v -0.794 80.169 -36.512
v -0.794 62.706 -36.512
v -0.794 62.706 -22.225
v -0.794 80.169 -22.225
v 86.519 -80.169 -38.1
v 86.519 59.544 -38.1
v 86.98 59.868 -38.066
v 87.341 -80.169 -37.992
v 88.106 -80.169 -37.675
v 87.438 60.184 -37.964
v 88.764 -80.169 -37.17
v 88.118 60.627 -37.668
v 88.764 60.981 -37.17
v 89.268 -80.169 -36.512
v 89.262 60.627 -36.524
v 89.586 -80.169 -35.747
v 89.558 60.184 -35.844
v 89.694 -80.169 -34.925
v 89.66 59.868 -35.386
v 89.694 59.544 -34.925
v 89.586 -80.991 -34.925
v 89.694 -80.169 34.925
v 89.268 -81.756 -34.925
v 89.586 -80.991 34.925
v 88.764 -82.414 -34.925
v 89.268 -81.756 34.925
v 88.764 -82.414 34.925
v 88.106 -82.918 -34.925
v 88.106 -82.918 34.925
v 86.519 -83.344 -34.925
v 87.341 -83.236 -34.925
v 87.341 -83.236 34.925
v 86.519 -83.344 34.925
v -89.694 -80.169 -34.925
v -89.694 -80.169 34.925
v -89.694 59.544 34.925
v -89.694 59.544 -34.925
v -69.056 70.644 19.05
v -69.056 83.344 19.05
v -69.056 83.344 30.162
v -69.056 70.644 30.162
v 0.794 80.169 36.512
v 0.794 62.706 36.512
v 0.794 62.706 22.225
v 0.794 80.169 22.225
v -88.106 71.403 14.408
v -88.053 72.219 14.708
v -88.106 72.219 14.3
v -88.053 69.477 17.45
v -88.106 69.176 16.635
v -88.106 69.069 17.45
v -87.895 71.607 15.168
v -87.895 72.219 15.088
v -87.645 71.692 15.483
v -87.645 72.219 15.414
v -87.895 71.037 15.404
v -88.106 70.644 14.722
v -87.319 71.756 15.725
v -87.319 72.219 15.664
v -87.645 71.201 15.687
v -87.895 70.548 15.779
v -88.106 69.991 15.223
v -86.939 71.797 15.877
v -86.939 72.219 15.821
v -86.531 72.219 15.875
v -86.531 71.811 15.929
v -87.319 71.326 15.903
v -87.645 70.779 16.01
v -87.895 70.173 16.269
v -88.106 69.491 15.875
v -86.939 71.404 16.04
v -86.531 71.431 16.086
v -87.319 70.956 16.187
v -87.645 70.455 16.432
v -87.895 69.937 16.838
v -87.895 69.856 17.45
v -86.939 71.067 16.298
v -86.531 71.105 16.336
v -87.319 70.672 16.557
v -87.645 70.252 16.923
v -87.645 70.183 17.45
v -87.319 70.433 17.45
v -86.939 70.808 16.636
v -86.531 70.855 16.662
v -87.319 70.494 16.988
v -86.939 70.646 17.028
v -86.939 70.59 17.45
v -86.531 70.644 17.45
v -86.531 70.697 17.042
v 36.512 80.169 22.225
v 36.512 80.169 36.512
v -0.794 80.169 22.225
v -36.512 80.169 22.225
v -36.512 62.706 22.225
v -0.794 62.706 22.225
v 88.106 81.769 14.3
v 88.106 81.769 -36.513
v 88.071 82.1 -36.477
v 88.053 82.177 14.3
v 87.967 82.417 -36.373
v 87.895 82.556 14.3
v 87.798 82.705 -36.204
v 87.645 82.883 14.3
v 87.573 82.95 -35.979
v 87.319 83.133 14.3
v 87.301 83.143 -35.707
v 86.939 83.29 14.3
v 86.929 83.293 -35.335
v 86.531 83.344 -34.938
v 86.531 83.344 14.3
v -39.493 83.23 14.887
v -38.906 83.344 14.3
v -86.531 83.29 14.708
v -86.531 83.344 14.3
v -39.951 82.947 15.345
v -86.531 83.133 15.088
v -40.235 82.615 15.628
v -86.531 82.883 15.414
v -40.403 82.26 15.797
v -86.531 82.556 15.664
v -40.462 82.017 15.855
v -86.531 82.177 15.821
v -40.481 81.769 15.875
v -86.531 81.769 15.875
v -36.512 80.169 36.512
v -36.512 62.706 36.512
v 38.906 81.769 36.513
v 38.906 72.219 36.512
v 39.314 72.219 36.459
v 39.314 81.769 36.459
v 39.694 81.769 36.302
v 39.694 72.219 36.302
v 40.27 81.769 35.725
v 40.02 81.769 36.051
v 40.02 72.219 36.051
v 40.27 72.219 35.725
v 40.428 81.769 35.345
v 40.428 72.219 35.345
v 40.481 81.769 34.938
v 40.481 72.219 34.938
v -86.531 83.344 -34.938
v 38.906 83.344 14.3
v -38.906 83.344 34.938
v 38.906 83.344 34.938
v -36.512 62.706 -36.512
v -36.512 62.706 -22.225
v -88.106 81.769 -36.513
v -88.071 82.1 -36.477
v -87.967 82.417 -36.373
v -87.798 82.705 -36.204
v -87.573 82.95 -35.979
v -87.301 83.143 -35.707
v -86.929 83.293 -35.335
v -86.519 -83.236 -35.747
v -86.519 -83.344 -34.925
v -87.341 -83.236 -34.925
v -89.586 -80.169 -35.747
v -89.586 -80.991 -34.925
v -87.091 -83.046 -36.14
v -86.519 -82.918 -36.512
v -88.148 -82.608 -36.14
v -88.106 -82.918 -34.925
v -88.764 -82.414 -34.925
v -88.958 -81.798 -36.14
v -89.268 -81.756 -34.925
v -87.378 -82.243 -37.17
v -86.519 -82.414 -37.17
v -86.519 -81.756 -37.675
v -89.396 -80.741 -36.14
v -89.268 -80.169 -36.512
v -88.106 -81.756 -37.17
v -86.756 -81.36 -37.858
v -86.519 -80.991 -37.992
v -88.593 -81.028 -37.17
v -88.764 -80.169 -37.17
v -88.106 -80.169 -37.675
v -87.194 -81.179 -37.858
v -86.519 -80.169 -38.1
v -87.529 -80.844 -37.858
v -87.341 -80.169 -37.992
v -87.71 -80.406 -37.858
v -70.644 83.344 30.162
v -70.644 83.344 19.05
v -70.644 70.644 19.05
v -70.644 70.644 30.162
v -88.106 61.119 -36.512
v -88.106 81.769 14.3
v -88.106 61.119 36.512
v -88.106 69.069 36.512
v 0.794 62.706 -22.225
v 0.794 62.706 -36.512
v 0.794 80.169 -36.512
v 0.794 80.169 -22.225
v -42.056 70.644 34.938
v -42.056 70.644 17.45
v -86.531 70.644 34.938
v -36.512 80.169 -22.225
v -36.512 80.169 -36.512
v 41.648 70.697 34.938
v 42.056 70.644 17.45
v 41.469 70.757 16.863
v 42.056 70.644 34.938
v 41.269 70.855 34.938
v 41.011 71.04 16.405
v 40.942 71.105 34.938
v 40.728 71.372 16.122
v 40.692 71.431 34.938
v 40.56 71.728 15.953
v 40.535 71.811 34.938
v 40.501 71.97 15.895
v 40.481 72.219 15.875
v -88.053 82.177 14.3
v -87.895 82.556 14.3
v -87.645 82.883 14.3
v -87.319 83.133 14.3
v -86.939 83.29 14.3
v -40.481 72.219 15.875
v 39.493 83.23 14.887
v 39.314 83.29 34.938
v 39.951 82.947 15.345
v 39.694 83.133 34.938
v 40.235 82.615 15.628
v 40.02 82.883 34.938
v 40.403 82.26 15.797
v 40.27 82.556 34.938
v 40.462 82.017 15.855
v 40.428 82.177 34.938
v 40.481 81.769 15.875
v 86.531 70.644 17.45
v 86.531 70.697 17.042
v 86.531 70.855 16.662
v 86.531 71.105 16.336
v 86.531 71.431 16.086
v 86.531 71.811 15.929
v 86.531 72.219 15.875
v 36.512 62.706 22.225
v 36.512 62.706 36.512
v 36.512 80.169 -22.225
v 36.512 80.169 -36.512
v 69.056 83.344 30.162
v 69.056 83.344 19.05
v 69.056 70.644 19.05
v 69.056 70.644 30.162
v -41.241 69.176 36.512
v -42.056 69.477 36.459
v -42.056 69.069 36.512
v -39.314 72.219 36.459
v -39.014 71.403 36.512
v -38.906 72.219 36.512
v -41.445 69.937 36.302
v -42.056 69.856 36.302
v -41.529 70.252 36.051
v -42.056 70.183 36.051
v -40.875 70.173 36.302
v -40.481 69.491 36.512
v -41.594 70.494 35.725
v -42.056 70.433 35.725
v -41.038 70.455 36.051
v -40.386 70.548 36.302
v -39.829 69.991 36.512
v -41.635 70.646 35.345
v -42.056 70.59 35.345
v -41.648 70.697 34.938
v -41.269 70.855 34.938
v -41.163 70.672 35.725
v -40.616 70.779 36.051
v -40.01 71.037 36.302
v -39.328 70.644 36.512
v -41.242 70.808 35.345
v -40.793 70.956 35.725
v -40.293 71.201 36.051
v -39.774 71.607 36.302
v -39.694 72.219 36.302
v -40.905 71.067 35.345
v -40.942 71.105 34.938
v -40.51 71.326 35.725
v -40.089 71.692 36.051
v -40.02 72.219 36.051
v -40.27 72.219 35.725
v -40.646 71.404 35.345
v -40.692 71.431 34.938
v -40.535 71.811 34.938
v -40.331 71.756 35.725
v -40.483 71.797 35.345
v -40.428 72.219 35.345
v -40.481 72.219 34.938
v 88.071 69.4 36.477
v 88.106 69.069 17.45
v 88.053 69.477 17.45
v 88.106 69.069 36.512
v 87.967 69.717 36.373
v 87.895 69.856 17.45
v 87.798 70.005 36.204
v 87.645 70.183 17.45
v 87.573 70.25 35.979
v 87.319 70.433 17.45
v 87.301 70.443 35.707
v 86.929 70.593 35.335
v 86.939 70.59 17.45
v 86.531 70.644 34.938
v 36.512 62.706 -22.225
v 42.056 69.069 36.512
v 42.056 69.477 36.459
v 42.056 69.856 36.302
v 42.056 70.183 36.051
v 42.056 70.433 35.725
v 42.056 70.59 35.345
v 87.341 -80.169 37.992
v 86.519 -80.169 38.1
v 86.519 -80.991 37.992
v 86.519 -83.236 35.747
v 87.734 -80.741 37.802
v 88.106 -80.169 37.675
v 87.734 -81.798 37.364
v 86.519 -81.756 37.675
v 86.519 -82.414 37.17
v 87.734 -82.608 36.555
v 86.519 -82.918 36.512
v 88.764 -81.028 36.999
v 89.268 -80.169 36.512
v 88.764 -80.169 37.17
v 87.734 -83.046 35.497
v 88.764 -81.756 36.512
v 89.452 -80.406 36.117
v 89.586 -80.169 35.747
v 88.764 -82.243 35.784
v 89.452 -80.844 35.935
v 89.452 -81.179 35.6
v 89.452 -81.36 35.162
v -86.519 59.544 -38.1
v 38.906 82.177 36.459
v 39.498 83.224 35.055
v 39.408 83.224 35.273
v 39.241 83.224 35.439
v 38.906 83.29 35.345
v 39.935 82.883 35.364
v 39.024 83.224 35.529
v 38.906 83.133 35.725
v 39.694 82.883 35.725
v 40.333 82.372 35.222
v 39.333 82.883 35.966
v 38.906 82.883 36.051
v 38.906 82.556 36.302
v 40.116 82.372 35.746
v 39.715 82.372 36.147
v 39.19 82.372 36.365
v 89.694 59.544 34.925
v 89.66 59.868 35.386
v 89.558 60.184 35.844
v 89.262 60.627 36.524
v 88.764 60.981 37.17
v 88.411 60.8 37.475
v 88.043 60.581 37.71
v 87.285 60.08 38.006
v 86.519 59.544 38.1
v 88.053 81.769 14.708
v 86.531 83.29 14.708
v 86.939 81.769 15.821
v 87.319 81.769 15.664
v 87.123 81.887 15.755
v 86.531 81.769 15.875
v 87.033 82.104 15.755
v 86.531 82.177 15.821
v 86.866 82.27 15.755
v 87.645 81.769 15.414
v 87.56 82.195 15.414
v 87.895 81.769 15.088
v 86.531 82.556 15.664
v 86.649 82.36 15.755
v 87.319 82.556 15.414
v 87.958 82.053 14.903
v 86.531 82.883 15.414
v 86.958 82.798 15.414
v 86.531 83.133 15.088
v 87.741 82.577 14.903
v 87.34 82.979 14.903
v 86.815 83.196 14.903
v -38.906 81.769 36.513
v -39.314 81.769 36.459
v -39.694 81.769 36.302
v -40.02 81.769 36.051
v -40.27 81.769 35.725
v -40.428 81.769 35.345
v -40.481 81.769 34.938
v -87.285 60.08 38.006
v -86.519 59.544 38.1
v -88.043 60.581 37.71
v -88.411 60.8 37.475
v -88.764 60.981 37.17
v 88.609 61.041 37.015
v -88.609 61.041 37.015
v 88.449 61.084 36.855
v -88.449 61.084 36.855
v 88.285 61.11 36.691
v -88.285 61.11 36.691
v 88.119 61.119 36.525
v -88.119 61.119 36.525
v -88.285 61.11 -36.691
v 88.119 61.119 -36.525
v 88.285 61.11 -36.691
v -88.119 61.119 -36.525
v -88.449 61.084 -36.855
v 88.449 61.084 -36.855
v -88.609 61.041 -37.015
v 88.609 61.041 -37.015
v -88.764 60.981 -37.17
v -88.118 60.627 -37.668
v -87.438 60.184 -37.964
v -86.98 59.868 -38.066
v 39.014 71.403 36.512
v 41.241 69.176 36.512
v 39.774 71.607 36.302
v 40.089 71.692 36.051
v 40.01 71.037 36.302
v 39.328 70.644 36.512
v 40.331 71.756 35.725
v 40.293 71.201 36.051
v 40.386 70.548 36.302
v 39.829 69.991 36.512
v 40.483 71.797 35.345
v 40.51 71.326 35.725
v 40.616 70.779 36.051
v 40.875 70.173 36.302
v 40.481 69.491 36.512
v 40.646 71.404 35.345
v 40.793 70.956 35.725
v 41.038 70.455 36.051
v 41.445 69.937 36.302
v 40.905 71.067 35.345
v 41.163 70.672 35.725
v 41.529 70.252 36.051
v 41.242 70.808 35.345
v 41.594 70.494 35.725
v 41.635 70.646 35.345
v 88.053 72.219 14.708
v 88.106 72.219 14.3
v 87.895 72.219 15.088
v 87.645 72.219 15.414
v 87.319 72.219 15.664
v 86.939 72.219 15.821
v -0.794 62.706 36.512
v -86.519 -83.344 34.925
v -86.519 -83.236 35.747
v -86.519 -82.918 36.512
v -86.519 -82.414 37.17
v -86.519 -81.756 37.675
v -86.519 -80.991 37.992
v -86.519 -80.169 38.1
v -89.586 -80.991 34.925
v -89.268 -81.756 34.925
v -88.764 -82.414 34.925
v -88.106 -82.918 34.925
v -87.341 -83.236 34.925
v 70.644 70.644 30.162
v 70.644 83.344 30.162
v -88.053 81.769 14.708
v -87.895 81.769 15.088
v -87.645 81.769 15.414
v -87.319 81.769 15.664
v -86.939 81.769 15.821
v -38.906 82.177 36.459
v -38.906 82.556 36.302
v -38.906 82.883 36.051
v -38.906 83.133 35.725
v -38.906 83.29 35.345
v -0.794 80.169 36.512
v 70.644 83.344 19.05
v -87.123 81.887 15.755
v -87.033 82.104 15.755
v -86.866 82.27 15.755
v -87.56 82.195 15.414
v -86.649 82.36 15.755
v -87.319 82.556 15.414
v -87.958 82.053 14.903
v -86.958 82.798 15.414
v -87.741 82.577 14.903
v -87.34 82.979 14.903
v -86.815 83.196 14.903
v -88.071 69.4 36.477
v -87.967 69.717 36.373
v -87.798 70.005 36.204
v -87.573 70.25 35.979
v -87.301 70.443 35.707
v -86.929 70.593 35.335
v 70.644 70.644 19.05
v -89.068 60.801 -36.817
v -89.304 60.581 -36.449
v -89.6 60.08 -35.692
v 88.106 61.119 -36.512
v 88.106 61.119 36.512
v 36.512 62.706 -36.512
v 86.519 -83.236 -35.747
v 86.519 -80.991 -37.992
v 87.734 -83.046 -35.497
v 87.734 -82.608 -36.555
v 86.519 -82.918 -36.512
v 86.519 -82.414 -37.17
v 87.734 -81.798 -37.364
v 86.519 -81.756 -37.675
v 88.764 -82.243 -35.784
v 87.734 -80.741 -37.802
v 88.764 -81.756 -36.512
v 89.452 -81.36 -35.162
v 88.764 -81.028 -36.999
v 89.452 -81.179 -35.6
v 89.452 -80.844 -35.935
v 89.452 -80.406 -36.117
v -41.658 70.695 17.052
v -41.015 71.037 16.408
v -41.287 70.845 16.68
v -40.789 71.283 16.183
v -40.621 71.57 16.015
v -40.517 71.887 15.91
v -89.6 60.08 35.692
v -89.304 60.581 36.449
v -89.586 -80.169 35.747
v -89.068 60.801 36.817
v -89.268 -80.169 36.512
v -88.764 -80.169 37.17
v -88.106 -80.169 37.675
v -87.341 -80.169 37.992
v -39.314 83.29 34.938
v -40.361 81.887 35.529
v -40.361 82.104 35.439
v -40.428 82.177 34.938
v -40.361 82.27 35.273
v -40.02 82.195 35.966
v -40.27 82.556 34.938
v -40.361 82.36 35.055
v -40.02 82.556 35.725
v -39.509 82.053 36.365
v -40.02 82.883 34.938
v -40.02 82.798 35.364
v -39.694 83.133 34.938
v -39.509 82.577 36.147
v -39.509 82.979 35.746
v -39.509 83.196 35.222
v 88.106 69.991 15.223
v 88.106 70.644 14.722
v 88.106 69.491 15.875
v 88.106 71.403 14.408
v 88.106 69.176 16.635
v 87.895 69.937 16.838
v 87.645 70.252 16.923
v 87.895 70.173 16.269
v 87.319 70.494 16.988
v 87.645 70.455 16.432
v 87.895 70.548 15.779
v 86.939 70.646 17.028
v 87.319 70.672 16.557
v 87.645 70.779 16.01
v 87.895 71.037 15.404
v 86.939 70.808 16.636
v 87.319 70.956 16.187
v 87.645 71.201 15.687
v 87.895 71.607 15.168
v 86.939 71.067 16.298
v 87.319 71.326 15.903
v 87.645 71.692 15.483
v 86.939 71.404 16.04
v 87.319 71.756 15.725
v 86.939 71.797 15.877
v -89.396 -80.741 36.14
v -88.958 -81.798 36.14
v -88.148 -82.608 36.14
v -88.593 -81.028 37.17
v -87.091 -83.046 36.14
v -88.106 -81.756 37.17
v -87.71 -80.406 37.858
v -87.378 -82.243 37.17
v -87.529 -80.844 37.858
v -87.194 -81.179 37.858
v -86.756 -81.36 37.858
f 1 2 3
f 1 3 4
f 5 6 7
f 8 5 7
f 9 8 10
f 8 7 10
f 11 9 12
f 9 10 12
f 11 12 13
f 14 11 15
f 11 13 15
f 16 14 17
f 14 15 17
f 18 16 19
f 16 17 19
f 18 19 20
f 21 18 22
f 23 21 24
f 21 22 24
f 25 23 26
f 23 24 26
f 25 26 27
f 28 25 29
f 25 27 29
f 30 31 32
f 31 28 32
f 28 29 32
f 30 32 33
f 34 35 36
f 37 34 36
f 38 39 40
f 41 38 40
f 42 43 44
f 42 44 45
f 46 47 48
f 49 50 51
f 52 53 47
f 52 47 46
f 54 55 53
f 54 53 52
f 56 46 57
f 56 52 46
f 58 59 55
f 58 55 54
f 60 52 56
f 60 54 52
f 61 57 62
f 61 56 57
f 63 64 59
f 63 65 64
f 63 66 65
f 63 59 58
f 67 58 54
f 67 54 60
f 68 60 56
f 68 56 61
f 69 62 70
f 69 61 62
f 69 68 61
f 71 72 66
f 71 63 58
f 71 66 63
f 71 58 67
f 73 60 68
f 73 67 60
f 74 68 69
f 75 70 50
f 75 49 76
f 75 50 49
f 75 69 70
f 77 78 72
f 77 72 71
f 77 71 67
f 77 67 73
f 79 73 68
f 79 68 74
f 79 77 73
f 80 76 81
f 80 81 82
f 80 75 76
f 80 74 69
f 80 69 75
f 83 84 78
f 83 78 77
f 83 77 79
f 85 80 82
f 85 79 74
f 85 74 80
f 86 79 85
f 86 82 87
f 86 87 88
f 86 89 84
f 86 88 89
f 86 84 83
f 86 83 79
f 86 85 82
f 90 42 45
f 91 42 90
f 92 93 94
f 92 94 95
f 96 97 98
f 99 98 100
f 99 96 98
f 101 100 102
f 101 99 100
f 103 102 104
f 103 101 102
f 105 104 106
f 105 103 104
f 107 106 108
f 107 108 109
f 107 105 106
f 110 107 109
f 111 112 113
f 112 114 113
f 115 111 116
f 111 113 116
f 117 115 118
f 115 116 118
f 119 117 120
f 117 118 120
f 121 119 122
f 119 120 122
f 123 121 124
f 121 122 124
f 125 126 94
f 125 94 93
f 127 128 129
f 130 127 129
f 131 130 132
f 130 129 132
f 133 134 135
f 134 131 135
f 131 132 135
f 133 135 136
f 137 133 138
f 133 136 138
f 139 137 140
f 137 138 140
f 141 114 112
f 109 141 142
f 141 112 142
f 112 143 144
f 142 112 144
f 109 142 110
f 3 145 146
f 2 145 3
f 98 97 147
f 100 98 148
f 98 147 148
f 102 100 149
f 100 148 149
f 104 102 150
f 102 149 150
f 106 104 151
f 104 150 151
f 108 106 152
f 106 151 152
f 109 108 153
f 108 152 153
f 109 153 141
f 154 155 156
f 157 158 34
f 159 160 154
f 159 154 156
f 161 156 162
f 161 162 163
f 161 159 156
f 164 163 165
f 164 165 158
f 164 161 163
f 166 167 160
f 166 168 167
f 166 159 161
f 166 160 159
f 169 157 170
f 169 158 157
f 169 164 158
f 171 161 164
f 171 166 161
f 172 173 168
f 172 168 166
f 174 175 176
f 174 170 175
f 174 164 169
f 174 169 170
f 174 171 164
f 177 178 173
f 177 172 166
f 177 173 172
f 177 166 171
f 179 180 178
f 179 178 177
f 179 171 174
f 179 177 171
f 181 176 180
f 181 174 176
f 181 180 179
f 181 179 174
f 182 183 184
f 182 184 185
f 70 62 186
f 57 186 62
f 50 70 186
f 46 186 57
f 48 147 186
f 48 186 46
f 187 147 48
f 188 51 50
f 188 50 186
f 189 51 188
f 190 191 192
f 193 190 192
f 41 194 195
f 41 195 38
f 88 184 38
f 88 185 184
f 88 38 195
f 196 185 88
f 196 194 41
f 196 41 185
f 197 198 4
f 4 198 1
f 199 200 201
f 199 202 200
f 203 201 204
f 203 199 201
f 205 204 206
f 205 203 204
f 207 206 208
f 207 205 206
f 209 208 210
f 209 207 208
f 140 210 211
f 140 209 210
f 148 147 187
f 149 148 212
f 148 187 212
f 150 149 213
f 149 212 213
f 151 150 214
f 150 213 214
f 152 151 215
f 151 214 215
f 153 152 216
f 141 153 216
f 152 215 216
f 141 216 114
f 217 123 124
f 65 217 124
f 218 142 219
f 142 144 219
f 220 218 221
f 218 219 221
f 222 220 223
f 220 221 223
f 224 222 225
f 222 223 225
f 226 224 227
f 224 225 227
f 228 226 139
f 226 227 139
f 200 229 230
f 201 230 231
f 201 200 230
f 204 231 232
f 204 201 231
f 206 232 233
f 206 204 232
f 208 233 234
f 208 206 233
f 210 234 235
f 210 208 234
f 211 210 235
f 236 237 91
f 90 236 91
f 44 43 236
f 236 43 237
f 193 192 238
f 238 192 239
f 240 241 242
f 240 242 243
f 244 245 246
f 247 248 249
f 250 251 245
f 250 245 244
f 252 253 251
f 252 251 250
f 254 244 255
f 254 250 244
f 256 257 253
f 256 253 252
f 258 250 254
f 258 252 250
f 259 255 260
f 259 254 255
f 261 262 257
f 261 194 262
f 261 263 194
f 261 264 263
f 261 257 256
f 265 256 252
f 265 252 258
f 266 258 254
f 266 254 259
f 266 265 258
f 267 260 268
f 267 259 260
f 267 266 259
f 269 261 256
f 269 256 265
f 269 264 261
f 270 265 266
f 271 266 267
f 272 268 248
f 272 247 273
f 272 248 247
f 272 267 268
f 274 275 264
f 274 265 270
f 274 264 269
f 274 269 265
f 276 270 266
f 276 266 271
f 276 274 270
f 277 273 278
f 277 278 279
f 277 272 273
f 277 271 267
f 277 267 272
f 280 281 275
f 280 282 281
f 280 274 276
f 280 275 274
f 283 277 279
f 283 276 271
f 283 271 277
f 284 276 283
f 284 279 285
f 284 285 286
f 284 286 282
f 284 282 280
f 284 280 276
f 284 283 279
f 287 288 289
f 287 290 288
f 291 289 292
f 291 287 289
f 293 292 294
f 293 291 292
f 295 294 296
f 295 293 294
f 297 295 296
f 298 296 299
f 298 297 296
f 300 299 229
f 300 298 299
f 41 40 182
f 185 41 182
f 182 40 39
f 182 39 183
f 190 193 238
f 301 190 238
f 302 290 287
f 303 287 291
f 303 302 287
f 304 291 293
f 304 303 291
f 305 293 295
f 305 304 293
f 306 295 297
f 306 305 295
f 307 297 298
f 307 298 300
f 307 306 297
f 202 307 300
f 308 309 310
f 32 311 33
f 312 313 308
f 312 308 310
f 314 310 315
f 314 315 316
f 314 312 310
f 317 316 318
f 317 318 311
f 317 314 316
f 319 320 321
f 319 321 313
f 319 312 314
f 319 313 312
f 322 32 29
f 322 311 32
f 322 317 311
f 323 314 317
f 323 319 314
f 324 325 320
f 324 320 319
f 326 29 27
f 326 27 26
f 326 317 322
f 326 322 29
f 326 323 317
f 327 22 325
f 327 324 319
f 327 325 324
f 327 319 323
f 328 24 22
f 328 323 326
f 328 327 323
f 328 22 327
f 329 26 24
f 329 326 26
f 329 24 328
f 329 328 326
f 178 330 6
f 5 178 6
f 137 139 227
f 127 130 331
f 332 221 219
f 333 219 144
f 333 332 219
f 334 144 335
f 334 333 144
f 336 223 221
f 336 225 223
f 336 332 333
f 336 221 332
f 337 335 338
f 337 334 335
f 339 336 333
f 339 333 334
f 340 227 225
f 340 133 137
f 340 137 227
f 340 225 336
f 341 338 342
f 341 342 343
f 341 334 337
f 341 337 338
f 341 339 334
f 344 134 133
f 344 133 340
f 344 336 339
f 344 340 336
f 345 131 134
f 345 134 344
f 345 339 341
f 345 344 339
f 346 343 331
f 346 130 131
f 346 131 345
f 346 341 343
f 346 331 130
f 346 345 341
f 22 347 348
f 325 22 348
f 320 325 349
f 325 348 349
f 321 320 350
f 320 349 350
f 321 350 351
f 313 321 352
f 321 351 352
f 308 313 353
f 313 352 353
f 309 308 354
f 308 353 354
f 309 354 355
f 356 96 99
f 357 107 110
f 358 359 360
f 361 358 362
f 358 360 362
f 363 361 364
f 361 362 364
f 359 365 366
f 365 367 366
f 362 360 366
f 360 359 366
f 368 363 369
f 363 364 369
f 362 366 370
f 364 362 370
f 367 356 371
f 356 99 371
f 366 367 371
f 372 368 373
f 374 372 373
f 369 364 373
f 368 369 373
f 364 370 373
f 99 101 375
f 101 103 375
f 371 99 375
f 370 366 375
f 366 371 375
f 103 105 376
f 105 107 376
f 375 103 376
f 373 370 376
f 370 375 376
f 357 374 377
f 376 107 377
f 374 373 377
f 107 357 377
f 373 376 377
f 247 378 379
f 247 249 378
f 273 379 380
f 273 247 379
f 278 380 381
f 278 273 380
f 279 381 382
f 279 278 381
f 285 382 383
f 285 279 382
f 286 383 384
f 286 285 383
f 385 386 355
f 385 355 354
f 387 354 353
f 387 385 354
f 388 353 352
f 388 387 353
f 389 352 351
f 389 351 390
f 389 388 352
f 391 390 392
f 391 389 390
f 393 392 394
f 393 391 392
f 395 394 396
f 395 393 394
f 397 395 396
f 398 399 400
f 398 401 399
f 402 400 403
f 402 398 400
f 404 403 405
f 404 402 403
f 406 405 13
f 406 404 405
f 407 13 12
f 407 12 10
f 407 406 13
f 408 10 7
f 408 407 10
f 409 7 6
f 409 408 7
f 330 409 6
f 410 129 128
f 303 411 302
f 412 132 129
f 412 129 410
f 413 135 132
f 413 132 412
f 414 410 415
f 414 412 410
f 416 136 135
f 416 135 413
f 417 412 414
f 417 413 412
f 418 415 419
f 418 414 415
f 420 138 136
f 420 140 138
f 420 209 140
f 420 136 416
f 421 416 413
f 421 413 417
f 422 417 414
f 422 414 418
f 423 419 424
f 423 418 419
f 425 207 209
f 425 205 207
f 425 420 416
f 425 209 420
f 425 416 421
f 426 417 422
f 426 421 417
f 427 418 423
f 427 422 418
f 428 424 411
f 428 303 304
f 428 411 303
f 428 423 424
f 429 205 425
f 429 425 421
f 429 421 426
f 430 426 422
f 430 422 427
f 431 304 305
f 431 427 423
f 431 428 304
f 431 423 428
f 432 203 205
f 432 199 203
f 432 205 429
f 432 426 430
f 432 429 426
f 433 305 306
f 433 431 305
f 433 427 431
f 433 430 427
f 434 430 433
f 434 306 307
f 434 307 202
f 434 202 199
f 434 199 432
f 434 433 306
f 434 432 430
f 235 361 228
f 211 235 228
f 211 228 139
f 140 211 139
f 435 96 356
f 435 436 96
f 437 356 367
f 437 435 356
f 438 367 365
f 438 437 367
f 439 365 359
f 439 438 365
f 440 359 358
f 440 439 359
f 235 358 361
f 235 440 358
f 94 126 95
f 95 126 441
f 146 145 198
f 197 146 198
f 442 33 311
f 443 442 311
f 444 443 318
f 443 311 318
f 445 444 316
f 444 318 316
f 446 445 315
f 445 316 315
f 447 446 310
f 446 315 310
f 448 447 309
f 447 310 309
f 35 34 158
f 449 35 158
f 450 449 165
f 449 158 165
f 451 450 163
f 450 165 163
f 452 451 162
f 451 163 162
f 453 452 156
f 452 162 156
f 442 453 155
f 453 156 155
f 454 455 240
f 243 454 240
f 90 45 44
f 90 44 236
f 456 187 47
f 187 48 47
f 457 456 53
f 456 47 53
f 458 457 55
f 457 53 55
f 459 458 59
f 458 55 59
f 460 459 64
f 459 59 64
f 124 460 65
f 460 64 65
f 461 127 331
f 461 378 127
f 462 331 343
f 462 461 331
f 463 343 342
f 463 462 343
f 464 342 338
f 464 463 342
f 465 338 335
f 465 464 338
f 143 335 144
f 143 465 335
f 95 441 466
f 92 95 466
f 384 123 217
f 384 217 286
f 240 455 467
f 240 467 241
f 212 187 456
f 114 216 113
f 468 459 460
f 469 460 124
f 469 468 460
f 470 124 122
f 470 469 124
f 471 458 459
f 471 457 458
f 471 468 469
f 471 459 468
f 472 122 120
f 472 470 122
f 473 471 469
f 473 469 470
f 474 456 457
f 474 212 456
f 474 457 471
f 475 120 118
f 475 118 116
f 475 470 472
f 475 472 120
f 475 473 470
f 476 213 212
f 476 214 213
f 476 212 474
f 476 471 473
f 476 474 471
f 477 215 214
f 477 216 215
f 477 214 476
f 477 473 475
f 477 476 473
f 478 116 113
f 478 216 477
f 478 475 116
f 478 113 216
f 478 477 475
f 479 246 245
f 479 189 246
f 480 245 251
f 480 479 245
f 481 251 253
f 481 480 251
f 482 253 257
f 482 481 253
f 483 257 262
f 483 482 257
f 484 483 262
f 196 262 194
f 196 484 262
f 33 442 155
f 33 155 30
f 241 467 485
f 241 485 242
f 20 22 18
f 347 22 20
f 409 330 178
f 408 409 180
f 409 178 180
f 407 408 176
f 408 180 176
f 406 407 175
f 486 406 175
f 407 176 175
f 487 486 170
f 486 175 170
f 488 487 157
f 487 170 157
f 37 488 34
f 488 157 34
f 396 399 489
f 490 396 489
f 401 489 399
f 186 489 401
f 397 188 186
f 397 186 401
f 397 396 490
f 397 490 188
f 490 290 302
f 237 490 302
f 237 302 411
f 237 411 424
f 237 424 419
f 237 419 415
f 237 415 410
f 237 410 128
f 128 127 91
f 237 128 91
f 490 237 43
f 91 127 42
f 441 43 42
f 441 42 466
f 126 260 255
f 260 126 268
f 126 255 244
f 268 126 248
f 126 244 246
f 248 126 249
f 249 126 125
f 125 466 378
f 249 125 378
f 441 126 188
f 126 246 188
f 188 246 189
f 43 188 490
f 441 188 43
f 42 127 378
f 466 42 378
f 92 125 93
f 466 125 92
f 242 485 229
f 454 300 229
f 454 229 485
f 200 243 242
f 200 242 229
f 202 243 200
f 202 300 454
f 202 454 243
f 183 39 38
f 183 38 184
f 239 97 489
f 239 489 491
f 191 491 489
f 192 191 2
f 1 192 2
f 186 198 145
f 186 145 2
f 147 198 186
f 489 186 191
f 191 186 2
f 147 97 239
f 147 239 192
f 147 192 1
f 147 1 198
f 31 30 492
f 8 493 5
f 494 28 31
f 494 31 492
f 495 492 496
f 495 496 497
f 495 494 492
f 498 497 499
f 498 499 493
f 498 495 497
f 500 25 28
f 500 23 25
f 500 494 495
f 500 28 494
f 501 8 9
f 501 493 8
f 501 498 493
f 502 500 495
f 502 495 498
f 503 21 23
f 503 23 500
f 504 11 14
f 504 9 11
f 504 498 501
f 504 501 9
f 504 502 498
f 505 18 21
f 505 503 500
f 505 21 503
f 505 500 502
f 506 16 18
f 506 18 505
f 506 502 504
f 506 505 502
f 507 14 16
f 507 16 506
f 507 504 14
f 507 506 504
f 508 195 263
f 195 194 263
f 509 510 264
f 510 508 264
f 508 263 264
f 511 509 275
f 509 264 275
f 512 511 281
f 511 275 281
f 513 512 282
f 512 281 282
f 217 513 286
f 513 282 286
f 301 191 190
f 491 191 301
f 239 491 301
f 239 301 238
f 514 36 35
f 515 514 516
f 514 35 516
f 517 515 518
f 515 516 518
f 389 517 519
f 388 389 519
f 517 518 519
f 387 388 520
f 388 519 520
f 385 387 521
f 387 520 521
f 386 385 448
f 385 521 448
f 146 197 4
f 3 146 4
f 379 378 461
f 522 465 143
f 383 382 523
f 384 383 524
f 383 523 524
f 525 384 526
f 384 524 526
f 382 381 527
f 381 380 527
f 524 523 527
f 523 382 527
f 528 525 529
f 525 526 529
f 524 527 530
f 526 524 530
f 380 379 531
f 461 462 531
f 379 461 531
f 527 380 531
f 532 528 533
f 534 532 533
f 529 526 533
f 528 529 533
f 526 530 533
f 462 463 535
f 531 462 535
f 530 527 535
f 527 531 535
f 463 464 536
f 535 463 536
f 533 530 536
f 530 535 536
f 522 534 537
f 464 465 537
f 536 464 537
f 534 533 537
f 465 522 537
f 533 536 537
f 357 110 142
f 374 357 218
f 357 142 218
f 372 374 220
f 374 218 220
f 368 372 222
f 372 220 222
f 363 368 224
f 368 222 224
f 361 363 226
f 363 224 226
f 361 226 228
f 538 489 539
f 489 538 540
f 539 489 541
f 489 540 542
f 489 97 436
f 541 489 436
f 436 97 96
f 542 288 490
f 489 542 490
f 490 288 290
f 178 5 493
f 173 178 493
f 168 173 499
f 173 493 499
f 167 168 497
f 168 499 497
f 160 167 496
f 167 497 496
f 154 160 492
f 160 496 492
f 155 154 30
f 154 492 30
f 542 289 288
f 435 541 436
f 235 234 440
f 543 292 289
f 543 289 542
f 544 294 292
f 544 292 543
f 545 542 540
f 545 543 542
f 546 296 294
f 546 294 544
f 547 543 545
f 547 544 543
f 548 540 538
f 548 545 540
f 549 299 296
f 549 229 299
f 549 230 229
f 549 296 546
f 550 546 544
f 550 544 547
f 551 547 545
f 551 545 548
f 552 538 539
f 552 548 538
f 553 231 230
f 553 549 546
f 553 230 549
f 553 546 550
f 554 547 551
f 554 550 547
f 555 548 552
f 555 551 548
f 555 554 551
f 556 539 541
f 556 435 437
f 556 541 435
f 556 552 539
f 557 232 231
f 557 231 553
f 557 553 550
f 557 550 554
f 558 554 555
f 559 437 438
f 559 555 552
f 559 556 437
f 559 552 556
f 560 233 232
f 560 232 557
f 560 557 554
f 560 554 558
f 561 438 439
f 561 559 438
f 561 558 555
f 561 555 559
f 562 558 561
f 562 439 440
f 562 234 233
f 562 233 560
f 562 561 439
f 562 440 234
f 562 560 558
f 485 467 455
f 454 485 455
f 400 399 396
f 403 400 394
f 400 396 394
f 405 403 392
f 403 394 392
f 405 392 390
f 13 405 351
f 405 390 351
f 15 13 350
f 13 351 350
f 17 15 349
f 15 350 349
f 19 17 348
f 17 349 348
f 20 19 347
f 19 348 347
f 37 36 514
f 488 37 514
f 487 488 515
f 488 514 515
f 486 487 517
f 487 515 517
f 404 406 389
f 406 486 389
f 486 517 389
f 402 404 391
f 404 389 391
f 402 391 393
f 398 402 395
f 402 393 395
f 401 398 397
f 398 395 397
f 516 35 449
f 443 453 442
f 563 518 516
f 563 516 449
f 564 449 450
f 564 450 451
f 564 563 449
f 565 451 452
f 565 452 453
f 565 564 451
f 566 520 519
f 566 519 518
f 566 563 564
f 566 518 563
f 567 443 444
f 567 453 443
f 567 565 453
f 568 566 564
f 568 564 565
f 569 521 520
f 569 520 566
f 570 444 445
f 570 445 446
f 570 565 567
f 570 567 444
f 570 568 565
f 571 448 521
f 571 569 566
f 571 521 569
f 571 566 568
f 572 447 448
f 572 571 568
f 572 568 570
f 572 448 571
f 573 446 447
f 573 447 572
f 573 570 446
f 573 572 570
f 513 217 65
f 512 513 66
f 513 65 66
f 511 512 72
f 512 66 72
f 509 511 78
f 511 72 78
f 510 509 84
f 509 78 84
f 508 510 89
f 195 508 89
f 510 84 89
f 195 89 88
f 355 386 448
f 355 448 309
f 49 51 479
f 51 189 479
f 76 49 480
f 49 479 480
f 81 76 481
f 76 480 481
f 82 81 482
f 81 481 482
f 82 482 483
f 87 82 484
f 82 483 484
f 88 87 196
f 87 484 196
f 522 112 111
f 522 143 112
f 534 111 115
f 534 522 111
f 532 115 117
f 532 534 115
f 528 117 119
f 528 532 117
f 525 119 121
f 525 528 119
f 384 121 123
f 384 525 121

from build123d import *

# Parameters (mm, degrees)
SKETCH1_W          = 179.3875
SKETCH1_H          = 166.6875
EXTRUDE1_DEPTH     = 38.1
SKETCH2_W          = 179.3875
SKETCH2_H          = 76.2
SKETCH2_W_2        = 176.2125
SKETCH2_H_2        = 73.025
CUT_EXTRUDE1_DEPTH = 22.225
SKETCH3_W          = 47.625
SKETCH3_H          = 20.6375
CUT_EXTRUDE2_DEPTH = 12.7
SKETCH4_W          = 35.71875
SKETCH4_H          = 17.4625
CUT_EXTRUDE3_DEPTH = 14.2875
FILLET1_R          = 1.5748
FILLET2_R          = 3.175
SKETCH5_W          = 1.5875
SKETCH5_H          = 11.1125
EXTRUDE3_DEPTH     = 12.7


with BuildPart() as part:
    # Sketch1 → Extrude1 (new, symmetric)
    with BuildSketch(Plane.XY):
        Rectangle(SKETCH1_W, SKETCH1_H)
    extrude(amount=EXTRUDE1_DEPTH, both=True)

    # Sketch2 → Cut-Extrude1 (cut)
    with BuildSketch(Plane(origin=(0, 83.34375, 0), x_dir=(-1, 0, 0), z_dir=(0, 1, 0))):
        Rectangle(SKETCH2_W, SKETCH2_H)
        Rectangle(SKETCH2_W_2, SKETCH2_H_2, mode=Mode.SUBTRACT)
    extrude(amount=-CUT_EXTRUDE1_DEPTH, mode=Mode.SUBTRACT)

    # Sketch3 → Cut-Extrude2 (cut)
    with BuildSketch(Plane(origin=(0, 83.34375, 0), x_dir=(-1, 0, 0), z_dir=(0, 1, 0))):
        with Locations((-64.29375, 26.19375)):
            Rectangle(SKETCH3_W, SKETCH3_H)
        with Locations((64.29375, 26.19375)):
            Rectangle(SKETCH3_W, SKETCH3_H)
    extrude(amount=-CUT_EXTRUDE2_DEPTH, mode=Mode.SUBTRACT)

    # Sketch4 → Cut-Extrude3 (cut)
    with BuildSketch(Plane.XY.offset(36.5125)):
        with Locations((-18.653125, 71.4375)):
            Rectangle(SKETCH4_W, SKETCH4_H)
        with Locations((18.653125, 71.4375)):
            Rectangle(SKETCH4_W, SKETCH4_H)
    cut_extrude3 = extrude(amount=-CUT_EXTRUDE3_DEPTH, mode=Mode.SUBTRACT)

    # Mirror1: Cut-Extrude3 across plane
    add(cut_extrude3.mirror(Plane.XY), mode=Mode.SUBTRACT)

    # Fillet1
    fillet1_edges = [part.edges().sort_by_distance(p)[0] for p in [
        (89.69375, 61.11875, 0),
        (0, 61.11875, 38.1),
        (-89.69375, 61.11875, 0),
        (0, 61.11875, -38.1),
        (0, 83.34375, -36.5125),
        (-88.10625, 83.34375, -10.31875),
        (88.10625, 83.34375, -10.31875),
        (88.10625, 70.64375, 26.19375),
        (88.10625, 76.99375, 15.875),
        (64.29375, 70.64375, 36.5125),
        (40.48125, 70.64375, 26.19375),
        (40.48125, 76.99375, 36.5125),
        (64.29375, 70.64375, 15.875),
        (64.29375, 83.34375, 15.875),
        (40.48125, 83.34375, 26.19375),
        (0, 83.34375, 36.5125),
        (-88.10625, 70.64375, 26.19375),
        (-64.29375, 70.64375, 15.875),
        (-88.10625, 76.99375, 15.875),
        (-40.48125, 70.64375, 26.19375),
        (-64.29375, 70.64375, 36.5125),
        (-40.48125, 76.99375, 36.5125),
        (-40.48125, 83.34375, 26.19375),
        (-64.29375, 83.34375, 15.875),
    ]]
    fillet(fillet1_edges, radius=FILLET1_R)

    # Fillet2
    # the kernel refuses this fillet: 3.175 mm, written as the material it takes off along each edge
    with BuildSketch(Plane(origin=(-86.51875, -80.16875, -34.925), x_dir=(-1, 0, 0), z_dir=(0, 0, -1))) as fillet2_piece_1_section:
        Polygon((0, 0), (FILLET2_R * 1.02, 0), (FILLET2_R * 1.02, -FILLET2_R * 1.02), (0, -FILLET2_R * 1.02), align=None)
    fillet2_piece_1 = extrude(amount=FILLET2_R * 1.02, mode=Mode.PRIVATE)
    fillet2_piece_1 = fillet2_piece_1 - Plane(origin=(-86.51875, -80.16875, -34.925), x_dir=(0.7071067811865475, 0.7071067811865477, 0), z_dir=(0, 0, -1)) * Sphere(FILLET2_R, mode=Mode.PRIVATE)
    add(fillet2_piece_1, mode=Mode.SUBTRACT)
    with BuildSketch(Plane(origin=(-86.51875, -80.16875, 34.925), x_dir=(-1, 0, 0), z_dir=(0, 0, 1))) as fillet2_piece_2_section:
        Polygon((0, 0), (FILLET2_R * 1.02, 0), (FILLET2_R * 1.02, FILLET2_R * 1.02), (0, FILLET2_R * 1.02), align=None)
    fillet2_piece_2 = extrude(amount=FILLET2_R * 1.02, mode=Mode.PRIVATE)
    fillet2_piece_2 = fillet2_piece_2 - Plane(origin=(-86.51875, -80.16875, 34.925), x_dir=(0.7071067811865475, 0.7071067811865477, 0), z_dir=(0, 0, 1)) * Sphere(FILLET2_R, mode=Mode.PRIVATE)
    add(fillet2_piece_2, mode=Mode.SUBTRACT)
    with BuildSketch(Plane(origin=(86.51875, -80.16875, 34.925), x_dir=(0, 0, 1), z_dir=(1, 0, 0))) as fillet2_piece_3_section:
        Polygon((0, 0), (FILLET2_R * 1.02, 0), (FILLET2_R * 1.02, FILLET2_R * 1.02), (0, FILLET2_R * 1.02), align=None)
    fillet2_piece_3 = extrude(amount=FILLET2_R * 1.02, mode=Mode.PRIVATE)
    fillet2_piece_3 = fillet2_piece_3 - Plane(origin=(86.51875, -80.16875, 34.925), x_dir=(0, 0.7071067811865475, -0.7071067811865475), z_dir=(1, 0, 0)) * Sphere(FILLET2_R, mode=Mode.PRIVATE)
    add(fillet2_piece_3, mode=Mode.SUBTRACT)
    with BuildSketch(Plane(origin=(86.51875, -80.16875, -34.925), x_dir=(0, 0, -1), z_dir=(1, 0, 0))) as fillet2_piece_4_section:
        Polygon((0, 0), (FILLET2_R * 1.02, 0), (FILLET2_R * 1.02, -FILLET2_R * 1.02), (0, -FILLET2_R * 1.02), align=None)
    fillet2_piece_4 = extrude(amount=FILLET2_R * 1.02, mode=Mode.PRIVATE)
    fillet2_piece_4 = fillet2_piece_4 - Plane(origin=(86.51875, -80.16875, -34.925), x_dir=(0, 0.7071067811865475, 0.7071067811865475), z_dir=(1, 0, 0)) * Sphere(FILLET2_R, mode=Mode.PRIVATE)
    add(fillet2_piece_4, mode=Mode.SUBTRACT)
    with BuildSketch(Plane(origin=(-89.69375, -83.34375, -34.925), x_dir=(0, 1, 0), z_dir=(0, 0, 1)), Plane(origin=(89.69375, -83.34375, 34.925), x_dir=(0, 1, 0), z_dir=(0, 0, -1))) as fillet2_piece_5:
        with BuildLine():
            CenterArc((FILLET2_R, -FILLET2_R), FILLET2_R, 90, 90)
            Line((0, -FILLET2_R), (0, 0))
            Line((0, 0), (FILLET2_R, 0))
        make_face()
    extrude(amount=69.85, mode=Mode.SUBTRACT)
    with BuildSketch(Plane(origin=(86.51875, -83.34375, 38.1), x_dir=(0, 1, 0), z_dir=(-1, 0, 0))) as fillet2_piece_6:
        with BuildLine():
            CenterArc((FILLET2_R, FILLET2_R), FILLET2_R, 180, 90)
            Line((0, FILLET2_R), (0, 0))
            Line((0, 0), (FILLET2_R, 0))
        make_face()
    extrude(amount=173.0375, mode=Mode.SUBTRACT)
    with BuildSketch(Plane(origin=(86.51875, -83.34375, -38.1), x_dir=(0, 1, 0), z_dir=(-1, 0, 0))) as fillet2_piece_7:
        with BuildLine():
            CenterArc((FILLET2_R, -FILLET2_R), FILLET2_R, 90, 90)
            Line((0, -FILLET2_R), (0, 0))
            Line((0, 0), (FILLET2_R, 0))
        make_face()
    extrude(amount=173.0375, mode=Mode.SUBTRACT)
    with BuildSketch(Plane(origin=(-89.69375, -80.16875, 38.1), x_dir=(1, 0, 0), z_dir=(0, 1, 0)), Plane(origin=(89.69375, 67.48145, -38.1), x_dir=(0, 0, 1), z_dir=(0, -1, 0))) as fillet2_piece_8:
        with BuildLine():
            CenterArc((FILLET2_R, FILLET2_R), FILLET2_R, 180, 90)
            Line((0, FILLET2_R), (0, 0))
            Line((0, 0), (FILLET2_R, 0))
        make_face()
    extrude(amount=147.6502, mode=Mode.SUBTRACT)
    with BuildSketch(Plane(origin=(-89.69375, -80.16875, -38.1), x_dir=(1, 0, 0), z_dir=(0, 1, 0)), Plane(origin=(89.69375, 67.48145, 38.1), x_dir=(0, 0, -1), z_dir=(0, -1, 0))) as fillet2_piece_9:
        with BuildLine():
            CenterArc((FILLET2_R, -FILLET2_R), FILLET2_R, 90, 90)
            Line((0, -FILLET2_R), (0, 0))
            Line((0, 0), (FILLET2_R, 0))
        make_face()
    extrude(amount=147.6502, mode=Mode.SUBTRACT)

    # Sketch5 → Extrude3 (add)
    with BuildSketch(Plane(origin=(0, 70.64375, 0), x_dir=(-1, 0, 0), z_dir=(0, 1, 0))):
        with Locations((-69.85, 24.60625)):
            Rectangle(SKETCH5_W, SKETCH5_H)
        with Locations((69.85, 24.60625)):
            Rectangle(SKETCH5_W, SKETCH5_H)
    extrude(amount=EXTRUDE3_DEPTH)


solid = part.part
